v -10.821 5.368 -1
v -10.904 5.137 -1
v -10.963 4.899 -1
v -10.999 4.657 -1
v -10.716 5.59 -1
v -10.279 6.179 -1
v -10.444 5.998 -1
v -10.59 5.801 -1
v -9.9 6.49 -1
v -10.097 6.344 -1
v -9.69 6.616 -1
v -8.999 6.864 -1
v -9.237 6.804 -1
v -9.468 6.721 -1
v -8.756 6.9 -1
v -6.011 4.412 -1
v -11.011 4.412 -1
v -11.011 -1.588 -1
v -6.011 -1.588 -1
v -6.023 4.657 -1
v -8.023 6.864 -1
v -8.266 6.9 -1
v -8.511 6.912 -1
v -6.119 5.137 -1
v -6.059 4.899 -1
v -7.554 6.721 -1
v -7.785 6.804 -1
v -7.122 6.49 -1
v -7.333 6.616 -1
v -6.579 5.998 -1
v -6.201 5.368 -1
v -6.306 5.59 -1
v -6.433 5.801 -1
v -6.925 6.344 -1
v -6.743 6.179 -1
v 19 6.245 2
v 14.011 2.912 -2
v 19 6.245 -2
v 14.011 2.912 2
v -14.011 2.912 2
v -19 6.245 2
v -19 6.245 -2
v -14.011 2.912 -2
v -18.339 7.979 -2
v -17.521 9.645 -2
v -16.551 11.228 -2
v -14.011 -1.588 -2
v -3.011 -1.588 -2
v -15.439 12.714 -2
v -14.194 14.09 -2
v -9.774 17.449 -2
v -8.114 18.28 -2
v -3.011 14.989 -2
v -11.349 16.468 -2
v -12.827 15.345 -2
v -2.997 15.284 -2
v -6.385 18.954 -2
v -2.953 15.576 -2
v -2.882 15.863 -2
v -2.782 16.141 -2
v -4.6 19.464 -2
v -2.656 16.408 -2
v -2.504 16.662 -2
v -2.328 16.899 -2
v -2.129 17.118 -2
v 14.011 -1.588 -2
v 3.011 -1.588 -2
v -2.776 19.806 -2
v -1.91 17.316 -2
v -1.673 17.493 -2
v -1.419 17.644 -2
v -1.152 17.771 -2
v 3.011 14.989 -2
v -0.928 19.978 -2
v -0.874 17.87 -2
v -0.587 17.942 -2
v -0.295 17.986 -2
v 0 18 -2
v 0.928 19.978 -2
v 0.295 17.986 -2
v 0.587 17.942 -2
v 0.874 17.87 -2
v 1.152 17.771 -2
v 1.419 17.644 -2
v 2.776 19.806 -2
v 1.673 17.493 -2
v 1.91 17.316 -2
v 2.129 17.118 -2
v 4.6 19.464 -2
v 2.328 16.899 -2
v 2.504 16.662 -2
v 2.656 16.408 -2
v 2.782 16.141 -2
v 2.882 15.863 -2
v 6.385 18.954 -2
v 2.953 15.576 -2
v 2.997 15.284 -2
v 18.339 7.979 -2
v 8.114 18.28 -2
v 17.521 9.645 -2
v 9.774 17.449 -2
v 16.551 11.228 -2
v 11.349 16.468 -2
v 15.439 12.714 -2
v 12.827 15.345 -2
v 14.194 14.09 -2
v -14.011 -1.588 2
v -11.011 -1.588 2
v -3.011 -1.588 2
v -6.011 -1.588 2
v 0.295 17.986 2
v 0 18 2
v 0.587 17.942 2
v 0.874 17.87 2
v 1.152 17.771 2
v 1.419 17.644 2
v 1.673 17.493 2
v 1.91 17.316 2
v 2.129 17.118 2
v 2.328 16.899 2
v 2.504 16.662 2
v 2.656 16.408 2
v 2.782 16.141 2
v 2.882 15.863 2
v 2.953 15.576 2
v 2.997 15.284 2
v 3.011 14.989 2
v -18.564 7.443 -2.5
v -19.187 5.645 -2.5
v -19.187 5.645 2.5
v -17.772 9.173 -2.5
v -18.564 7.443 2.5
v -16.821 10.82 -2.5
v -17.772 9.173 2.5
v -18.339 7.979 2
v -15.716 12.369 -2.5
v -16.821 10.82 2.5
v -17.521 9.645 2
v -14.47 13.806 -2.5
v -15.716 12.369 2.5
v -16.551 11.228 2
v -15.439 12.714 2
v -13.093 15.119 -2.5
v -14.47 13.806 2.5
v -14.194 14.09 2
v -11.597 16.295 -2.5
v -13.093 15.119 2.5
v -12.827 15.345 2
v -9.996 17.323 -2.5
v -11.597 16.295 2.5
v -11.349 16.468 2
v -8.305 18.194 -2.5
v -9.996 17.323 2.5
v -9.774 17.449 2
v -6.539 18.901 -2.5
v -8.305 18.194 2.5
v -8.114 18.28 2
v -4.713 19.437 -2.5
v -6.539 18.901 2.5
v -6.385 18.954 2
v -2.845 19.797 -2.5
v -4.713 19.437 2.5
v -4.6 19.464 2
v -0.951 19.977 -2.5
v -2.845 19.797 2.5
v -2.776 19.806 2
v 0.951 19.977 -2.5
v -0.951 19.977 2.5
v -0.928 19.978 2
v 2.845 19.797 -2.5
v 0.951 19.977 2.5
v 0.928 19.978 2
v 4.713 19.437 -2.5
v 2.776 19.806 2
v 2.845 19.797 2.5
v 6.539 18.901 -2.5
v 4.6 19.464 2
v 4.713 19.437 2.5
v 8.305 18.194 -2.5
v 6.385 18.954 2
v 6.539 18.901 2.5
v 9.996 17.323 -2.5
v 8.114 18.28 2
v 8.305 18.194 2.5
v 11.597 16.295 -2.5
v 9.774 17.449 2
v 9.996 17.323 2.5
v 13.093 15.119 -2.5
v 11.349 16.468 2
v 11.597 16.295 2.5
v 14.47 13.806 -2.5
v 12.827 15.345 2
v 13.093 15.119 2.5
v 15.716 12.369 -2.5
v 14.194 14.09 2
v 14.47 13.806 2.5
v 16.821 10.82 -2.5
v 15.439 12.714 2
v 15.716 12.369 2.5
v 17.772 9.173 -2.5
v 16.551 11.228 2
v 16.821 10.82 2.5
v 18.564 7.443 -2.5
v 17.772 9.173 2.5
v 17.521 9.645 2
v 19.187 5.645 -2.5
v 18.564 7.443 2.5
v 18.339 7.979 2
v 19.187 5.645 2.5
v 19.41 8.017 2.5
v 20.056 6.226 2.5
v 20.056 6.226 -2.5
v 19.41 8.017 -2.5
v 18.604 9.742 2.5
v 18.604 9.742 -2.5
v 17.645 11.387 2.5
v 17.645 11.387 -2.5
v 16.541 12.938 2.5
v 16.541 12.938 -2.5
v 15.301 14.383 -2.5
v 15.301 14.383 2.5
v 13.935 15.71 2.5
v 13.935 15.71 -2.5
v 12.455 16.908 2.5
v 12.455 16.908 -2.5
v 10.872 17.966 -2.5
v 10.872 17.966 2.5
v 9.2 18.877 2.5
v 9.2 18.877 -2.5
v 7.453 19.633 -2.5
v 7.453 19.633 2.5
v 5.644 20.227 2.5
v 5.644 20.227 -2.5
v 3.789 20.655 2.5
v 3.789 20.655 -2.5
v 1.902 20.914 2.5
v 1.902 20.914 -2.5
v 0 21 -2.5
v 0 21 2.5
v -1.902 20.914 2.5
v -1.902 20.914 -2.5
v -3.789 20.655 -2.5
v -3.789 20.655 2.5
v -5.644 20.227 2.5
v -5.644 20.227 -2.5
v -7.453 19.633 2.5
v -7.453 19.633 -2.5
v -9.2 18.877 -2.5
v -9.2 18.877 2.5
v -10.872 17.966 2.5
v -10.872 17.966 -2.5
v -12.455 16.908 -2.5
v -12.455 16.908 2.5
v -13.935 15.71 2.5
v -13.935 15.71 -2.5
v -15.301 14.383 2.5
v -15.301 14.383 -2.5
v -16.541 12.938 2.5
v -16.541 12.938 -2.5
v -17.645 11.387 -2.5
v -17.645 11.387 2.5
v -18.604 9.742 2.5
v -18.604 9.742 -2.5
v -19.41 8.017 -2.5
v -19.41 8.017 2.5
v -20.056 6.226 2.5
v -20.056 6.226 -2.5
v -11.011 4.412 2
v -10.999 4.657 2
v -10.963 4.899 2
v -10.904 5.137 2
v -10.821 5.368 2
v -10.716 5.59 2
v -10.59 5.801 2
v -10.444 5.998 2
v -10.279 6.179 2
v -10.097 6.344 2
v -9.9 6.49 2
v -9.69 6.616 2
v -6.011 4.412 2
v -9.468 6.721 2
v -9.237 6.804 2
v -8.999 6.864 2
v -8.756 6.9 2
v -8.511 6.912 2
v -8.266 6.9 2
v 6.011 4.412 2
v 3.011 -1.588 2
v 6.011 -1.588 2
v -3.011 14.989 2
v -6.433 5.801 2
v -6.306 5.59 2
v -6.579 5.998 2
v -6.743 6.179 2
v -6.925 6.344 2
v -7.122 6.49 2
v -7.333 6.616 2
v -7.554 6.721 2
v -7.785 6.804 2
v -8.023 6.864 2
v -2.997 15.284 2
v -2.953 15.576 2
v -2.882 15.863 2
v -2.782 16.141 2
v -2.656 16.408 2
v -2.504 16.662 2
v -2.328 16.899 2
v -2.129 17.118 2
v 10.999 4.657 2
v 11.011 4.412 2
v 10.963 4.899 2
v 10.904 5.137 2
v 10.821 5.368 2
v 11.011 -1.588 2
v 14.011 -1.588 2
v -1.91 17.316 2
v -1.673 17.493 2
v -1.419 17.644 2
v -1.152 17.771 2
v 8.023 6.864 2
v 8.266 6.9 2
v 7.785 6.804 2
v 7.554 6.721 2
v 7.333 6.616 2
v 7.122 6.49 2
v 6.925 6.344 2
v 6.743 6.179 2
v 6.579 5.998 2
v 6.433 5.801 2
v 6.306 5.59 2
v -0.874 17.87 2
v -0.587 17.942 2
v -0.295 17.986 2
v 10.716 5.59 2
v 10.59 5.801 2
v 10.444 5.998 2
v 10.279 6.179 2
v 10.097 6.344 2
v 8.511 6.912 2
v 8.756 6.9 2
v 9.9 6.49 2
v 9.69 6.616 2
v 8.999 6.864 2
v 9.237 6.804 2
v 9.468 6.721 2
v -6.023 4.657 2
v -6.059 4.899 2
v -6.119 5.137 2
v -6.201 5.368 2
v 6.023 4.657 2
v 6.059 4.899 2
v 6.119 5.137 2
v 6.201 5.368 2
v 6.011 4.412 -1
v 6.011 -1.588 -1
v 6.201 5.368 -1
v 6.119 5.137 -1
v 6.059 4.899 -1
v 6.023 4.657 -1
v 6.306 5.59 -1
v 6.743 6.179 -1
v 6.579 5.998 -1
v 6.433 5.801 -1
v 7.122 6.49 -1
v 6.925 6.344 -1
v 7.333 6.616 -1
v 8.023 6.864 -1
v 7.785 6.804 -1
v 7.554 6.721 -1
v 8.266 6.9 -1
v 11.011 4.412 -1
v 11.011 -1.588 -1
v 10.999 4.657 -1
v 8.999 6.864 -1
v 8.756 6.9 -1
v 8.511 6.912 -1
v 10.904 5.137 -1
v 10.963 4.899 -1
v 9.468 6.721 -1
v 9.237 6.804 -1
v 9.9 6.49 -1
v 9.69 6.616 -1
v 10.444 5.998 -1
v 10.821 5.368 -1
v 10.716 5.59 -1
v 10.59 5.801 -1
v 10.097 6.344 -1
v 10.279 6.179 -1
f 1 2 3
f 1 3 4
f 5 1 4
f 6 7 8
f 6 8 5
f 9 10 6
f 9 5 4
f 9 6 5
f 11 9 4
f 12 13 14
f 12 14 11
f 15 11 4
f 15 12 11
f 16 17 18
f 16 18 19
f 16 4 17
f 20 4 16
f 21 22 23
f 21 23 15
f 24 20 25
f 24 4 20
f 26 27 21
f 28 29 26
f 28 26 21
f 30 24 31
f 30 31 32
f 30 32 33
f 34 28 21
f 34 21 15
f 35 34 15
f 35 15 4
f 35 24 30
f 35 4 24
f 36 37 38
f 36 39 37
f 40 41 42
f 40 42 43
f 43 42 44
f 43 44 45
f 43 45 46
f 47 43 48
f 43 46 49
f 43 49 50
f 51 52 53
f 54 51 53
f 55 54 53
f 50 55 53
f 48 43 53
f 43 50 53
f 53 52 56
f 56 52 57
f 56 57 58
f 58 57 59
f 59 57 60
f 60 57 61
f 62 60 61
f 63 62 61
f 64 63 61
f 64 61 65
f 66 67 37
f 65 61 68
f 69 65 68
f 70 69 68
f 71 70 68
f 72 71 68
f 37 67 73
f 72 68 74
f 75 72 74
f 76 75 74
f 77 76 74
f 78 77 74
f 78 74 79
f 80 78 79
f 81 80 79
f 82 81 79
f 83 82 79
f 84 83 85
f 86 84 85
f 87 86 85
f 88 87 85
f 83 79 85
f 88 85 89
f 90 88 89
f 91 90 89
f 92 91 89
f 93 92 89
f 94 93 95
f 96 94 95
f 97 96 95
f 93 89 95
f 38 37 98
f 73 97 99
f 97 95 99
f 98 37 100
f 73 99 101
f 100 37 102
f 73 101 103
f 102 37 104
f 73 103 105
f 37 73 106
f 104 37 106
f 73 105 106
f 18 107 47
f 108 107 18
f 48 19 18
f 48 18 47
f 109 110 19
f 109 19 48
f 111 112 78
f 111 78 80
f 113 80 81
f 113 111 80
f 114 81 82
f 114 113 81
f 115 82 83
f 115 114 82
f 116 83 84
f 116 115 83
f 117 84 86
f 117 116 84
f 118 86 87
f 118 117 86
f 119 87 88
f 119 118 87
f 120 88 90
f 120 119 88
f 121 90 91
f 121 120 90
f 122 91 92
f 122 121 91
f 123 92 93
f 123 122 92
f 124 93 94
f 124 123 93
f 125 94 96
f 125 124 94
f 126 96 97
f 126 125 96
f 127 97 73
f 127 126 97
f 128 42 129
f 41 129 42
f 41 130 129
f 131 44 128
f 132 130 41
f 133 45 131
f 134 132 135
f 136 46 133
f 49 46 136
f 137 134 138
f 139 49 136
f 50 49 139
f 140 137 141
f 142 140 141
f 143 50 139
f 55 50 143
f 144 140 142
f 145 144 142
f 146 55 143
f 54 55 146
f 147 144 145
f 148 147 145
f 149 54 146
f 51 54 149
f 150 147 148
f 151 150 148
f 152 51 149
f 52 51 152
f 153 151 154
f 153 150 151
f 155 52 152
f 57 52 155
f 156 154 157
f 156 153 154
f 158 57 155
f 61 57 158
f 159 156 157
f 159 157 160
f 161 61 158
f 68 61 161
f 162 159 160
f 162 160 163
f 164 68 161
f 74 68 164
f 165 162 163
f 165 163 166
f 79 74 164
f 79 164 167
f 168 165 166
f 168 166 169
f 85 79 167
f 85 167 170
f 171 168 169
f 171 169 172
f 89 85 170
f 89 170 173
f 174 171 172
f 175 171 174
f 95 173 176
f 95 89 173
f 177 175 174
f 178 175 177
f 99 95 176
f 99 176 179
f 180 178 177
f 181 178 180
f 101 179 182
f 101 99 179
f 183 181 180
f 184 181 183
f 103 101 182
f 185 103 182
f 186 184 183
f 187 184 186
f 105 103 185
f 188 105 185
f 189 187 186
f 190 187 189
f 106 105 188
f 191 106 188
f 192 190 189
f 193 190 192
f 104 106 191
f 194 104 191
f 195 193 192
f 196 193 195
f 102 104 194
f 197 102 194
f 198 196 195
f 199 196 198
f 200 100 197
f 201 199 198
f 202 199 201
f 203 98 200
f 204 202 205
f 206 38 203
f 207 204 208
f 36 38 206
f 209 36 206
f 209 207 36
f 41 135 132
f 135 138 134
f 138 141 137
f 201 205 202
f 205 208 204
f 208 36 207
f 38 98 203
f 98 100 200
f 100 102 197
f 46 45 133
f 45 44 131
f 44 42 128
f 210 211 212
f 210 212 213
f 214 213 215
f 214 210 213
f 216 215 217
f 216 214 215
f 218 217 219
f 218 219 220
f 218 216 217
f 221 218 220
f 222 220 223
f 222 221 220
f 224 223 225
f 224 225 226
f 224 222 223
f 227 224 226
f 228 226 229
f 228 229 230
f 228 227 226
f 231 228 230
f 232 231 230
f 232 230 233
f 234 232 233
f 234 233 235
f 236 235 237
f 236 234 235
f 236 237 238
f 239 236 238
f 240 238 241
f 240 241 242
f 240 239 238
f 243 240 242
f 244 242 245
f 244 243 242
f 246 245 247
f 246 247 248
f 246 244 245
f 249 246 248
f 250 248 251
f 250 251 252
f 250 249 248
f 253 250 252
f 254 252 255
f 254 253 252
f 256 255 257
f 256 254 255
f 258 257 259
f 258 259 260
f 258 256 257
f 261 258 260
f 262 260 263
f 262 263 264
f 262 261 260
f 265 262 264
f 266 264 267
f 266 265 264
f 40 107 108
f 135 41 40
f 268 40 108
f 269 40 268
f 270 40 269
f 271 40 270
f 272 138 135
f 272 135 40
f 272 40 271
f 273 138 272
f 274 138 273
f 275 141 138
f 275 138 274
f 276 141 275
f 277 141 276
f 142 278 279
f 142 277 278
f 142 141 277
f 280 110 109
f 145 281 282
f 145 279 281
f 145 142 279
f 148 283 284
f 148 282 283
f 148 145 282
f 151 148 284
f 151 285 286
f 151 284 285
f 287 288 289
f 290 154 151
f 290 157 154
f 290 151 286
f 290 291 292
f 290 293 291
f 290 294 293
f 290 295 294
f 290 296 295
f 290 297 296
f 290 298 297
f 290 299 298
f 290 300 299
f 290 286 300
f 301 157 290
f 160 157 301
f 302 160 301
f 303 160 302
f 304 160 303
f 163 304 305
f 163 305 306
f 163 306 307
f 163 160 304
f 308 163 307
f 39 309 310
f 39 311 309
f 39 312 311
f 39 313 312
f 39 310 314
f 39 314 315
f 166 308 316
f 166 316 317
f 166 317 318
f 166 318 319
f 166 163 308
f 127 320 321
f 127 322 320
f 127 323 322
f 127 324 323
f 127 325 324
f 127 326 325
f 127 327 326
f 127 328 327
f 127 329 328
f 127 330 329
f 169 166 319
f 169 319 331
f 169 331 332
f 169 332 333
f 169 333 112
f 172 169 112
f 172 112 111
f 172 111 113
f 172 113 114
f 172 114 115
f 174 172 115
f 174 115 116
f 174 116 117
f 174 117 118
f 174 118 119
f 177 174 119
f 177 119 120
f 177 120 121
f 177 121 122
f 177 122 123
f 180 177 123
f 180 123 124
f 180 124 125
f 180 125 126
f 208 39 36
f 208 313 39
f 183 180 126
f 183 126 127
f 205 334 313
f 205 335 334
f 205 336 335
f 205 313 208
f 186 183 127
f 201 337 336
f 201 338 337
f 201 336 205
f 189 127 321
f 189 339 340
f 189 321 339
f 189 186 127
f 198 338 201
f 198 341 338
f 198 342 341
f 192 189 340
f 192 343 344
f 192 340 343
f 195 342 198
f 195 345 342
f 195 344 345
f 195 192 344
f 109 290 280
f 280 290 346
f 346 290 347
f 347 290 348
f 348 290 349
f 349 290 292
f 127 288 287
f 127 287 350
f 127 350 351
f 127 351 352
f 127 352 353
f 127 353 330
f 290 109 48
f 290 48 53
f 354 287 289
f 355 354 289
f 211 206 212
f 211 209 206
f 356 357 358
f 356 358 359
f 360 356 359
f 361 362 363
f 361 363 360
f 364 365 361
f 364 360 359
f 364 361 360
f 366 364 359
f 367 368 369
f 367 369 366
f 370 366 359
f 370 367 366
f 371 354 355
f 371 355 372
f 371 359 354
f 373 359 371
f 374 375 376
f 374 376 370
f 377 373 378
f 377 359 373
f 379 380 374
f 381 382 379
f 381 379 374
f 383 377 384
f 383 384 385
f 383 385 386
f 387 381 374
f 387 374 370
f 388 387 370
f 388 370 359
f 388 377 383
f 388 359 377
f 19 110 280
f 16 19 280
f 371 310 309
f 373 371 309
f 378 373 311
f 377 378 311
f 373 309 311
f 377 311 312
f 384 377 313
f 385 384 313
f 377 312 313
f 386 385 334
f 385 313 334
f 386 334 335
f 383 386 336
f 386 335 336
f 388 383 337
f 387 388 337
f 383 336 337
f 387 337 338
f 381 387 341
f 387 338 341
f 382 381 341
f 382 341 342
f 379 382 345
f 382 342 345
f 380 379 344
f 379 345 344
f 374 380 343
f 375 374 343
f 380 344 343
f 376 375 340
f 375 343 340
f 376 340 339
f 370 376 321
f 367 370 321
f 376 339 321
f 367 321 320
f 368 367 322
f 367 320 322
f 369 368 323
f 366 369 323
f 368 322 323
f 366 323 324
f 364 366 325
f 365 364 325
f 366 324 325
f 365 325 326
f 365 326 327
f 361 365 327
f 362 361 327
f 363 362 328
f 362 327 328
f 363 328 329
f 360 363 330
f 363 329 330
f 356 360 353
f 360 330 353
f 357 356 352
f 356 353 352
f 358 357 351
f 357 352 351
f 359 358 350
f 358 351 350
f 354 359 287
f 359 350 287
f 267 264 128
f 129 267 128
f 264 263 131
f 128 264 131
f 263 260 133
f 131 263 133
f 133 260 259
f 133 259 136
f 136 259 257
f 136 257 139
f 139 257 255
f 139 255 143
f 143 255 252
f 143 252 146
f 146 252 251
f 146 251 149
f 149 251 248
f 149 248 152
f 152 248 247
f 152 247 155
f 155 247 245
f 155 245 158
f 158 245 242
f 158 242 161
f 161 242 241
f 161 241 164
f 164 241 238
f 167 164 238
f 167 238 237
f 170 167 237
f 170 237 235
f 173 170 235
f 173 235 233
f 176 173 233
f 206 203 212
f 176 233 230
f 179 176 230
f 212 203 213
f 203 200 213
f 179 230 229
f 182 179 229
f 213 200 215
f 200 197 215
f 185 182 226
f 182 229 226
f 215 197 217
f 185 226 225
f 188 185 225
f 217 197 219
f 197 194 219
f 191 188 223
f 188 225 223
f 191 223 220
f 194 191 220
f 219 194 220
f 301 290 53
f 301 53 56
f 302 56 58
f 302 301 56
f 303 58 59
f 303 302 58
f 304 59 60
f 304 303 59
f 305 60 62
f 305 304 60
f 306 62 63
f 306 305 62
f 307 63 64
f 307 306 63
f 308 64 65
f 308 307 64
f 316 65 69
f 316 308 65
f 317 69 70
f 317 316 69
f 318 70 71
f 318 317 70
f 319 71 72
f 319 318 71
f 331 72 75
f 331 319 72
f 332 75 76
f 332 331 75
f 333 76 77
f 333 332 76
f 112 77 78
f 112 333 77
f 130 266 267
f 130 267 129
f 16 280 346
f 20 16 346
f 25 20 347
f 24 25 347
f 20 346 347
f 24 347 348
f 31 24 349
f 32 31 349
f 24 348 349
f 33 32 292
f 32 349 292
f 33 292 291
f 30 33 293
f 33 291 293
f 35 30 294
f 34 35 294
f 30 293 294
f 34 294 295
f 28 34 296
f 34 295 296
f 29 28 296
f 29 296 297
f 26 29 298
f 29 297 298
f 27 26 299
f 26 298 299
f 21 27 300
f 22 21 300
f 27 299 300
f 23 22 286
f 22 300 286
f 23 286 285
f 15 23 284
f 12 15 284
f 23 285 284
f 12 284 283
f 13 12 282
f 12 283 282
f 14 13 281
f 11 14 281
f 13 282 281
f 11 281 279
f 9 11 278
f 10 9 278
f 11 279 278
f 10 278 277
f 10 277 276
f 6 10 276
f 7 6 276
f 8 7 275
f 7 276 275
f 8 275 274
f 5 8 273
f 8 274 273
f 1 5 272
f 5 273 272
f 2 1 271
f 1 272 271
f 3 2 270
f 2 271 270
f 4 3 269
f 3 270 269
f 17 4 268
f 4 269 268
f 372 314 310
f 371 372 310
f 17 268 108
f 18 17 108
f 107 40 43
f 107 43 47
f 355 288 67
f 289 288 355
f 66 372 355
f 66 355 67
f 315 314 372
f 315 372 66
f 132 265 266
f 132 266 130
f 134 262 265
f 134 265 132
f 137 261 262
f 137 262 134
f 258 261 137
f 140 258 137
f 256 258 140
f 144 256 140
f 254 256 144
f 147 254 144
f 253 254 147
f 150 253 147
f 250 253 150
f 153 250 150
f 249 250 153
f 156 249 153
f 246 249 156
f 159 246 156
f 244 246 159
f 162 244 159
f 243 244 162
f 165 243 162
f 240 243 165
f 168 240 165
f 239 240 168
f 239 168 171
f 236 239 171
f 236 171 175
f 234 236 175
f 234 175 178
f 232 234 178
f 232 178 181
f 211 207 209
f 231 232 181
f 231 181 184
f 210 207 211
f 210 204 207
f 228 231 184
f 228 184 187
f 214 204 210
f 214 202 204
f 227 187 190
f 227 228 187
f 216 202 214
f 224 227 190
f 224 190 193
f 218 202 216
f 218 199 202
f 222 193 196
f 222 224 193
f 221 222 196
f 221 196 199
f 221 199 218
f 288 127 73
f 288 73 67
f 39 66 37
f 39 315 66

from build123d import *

# Parameters (mm, degrees)
F1_DEPTH      = 2
F1_DEPTH_BACK = 2
F3_DEPTH      = 2.5
F3_DEPTH_BACK = 2.5
F5_DEPTH      = 3


with BuildPart() as f1:
    # F0 (on Top) → F1 (new body, two sides)
    with BuildSketch(Plane.XY) as f1_sk:
        with BuildLine():
            Line((14.011182, 2.911577), (19, 6.244998))
            ThreePointArc((19, 6.244998), (0, 20), (-19, 6.244998))
            Line((-19, 6.244998), (-14.011182, 2.911577))
            Line((-14.011182, 2.911577), (-14.011182, -1.588423))
            Line((-14.011182, -1.588423), (-3.011182, -1.588423))
            Line((-3.011182, -1.588423), (-3.011182, 14.988818))
            ThreePointArc((-3.011182, 14.988818), (-2.129227, 17.118045), (0, 18))
            ThreePointArc((0, 18), (2.129227, 17.118045), (3.011182, 14.988818))
            Line((3.011182, 14.988818), (3.011182, -1.588423))
            Line((3.011182, -1.588423), (14.011182, -1.588423))
            Line((14.011182, -1.588423), (14.011182, 2.911577))
        make_face()
    extrude(amount=F1_DEPTH)
    extrude(f1_sk.sketch, amount=-F1_DEPTH_BACK)

    # F2 (on Top) → F3 (join, two sides)
    with BuildSketch(Plane.XY) as f3_sk:
        with BuildLine():
            Line((19.186818, 5.644998), (20.055932, 6.225721))
            ThreePointArc((20.055932, 6.225721), (0, 21), (-20.055932, 6.225721))
            Line((-20.055932, 6.225721), (-19.186818, 5.644998))
            ThreePointArc((-19.186818, 5.644998), (0, 20), (19.186818, 5.644998))
        make_face()
    extrude(amount=F3_DEPTH)
    extrude(f3_sk.sketch, amount=-F3_DEPTH_BACK)

    # F4 (on face) → F5 (cut)
    with BuildSketch(Plane.XY.offset(2)):
        with BuildLine():
            Line((-11.011182, 4.411577), (-11.011182, -1.588423))
            Line((-11.011182, -1.588423), (-6.011182, -1.588423))
            Line((-6.011182, -1.588423), (-6.011182, 4.411577))
            ThreePointArc((-6.011182, 4.411577), (-8.511182, 6.911577), (-11.011182, 4.411577))
        make_face()
        with BuildLine():
            Line((6.011182, 4.411577), (6.011182, -1.588423))
            Line((6.011182, -1.588423), (11.011182, -1.588423))
            Line((11.011182, -1.588423), (11.011182, 4.411577))
            ThreePointArc((11.011182, 4.411577), (8.511182, 6.911577), (6.011182, 4.411577))
        make_face()
    extrude(amount=-F5_DEPTH, mode=Mode.SUBTRACT)


solid = f1.part
